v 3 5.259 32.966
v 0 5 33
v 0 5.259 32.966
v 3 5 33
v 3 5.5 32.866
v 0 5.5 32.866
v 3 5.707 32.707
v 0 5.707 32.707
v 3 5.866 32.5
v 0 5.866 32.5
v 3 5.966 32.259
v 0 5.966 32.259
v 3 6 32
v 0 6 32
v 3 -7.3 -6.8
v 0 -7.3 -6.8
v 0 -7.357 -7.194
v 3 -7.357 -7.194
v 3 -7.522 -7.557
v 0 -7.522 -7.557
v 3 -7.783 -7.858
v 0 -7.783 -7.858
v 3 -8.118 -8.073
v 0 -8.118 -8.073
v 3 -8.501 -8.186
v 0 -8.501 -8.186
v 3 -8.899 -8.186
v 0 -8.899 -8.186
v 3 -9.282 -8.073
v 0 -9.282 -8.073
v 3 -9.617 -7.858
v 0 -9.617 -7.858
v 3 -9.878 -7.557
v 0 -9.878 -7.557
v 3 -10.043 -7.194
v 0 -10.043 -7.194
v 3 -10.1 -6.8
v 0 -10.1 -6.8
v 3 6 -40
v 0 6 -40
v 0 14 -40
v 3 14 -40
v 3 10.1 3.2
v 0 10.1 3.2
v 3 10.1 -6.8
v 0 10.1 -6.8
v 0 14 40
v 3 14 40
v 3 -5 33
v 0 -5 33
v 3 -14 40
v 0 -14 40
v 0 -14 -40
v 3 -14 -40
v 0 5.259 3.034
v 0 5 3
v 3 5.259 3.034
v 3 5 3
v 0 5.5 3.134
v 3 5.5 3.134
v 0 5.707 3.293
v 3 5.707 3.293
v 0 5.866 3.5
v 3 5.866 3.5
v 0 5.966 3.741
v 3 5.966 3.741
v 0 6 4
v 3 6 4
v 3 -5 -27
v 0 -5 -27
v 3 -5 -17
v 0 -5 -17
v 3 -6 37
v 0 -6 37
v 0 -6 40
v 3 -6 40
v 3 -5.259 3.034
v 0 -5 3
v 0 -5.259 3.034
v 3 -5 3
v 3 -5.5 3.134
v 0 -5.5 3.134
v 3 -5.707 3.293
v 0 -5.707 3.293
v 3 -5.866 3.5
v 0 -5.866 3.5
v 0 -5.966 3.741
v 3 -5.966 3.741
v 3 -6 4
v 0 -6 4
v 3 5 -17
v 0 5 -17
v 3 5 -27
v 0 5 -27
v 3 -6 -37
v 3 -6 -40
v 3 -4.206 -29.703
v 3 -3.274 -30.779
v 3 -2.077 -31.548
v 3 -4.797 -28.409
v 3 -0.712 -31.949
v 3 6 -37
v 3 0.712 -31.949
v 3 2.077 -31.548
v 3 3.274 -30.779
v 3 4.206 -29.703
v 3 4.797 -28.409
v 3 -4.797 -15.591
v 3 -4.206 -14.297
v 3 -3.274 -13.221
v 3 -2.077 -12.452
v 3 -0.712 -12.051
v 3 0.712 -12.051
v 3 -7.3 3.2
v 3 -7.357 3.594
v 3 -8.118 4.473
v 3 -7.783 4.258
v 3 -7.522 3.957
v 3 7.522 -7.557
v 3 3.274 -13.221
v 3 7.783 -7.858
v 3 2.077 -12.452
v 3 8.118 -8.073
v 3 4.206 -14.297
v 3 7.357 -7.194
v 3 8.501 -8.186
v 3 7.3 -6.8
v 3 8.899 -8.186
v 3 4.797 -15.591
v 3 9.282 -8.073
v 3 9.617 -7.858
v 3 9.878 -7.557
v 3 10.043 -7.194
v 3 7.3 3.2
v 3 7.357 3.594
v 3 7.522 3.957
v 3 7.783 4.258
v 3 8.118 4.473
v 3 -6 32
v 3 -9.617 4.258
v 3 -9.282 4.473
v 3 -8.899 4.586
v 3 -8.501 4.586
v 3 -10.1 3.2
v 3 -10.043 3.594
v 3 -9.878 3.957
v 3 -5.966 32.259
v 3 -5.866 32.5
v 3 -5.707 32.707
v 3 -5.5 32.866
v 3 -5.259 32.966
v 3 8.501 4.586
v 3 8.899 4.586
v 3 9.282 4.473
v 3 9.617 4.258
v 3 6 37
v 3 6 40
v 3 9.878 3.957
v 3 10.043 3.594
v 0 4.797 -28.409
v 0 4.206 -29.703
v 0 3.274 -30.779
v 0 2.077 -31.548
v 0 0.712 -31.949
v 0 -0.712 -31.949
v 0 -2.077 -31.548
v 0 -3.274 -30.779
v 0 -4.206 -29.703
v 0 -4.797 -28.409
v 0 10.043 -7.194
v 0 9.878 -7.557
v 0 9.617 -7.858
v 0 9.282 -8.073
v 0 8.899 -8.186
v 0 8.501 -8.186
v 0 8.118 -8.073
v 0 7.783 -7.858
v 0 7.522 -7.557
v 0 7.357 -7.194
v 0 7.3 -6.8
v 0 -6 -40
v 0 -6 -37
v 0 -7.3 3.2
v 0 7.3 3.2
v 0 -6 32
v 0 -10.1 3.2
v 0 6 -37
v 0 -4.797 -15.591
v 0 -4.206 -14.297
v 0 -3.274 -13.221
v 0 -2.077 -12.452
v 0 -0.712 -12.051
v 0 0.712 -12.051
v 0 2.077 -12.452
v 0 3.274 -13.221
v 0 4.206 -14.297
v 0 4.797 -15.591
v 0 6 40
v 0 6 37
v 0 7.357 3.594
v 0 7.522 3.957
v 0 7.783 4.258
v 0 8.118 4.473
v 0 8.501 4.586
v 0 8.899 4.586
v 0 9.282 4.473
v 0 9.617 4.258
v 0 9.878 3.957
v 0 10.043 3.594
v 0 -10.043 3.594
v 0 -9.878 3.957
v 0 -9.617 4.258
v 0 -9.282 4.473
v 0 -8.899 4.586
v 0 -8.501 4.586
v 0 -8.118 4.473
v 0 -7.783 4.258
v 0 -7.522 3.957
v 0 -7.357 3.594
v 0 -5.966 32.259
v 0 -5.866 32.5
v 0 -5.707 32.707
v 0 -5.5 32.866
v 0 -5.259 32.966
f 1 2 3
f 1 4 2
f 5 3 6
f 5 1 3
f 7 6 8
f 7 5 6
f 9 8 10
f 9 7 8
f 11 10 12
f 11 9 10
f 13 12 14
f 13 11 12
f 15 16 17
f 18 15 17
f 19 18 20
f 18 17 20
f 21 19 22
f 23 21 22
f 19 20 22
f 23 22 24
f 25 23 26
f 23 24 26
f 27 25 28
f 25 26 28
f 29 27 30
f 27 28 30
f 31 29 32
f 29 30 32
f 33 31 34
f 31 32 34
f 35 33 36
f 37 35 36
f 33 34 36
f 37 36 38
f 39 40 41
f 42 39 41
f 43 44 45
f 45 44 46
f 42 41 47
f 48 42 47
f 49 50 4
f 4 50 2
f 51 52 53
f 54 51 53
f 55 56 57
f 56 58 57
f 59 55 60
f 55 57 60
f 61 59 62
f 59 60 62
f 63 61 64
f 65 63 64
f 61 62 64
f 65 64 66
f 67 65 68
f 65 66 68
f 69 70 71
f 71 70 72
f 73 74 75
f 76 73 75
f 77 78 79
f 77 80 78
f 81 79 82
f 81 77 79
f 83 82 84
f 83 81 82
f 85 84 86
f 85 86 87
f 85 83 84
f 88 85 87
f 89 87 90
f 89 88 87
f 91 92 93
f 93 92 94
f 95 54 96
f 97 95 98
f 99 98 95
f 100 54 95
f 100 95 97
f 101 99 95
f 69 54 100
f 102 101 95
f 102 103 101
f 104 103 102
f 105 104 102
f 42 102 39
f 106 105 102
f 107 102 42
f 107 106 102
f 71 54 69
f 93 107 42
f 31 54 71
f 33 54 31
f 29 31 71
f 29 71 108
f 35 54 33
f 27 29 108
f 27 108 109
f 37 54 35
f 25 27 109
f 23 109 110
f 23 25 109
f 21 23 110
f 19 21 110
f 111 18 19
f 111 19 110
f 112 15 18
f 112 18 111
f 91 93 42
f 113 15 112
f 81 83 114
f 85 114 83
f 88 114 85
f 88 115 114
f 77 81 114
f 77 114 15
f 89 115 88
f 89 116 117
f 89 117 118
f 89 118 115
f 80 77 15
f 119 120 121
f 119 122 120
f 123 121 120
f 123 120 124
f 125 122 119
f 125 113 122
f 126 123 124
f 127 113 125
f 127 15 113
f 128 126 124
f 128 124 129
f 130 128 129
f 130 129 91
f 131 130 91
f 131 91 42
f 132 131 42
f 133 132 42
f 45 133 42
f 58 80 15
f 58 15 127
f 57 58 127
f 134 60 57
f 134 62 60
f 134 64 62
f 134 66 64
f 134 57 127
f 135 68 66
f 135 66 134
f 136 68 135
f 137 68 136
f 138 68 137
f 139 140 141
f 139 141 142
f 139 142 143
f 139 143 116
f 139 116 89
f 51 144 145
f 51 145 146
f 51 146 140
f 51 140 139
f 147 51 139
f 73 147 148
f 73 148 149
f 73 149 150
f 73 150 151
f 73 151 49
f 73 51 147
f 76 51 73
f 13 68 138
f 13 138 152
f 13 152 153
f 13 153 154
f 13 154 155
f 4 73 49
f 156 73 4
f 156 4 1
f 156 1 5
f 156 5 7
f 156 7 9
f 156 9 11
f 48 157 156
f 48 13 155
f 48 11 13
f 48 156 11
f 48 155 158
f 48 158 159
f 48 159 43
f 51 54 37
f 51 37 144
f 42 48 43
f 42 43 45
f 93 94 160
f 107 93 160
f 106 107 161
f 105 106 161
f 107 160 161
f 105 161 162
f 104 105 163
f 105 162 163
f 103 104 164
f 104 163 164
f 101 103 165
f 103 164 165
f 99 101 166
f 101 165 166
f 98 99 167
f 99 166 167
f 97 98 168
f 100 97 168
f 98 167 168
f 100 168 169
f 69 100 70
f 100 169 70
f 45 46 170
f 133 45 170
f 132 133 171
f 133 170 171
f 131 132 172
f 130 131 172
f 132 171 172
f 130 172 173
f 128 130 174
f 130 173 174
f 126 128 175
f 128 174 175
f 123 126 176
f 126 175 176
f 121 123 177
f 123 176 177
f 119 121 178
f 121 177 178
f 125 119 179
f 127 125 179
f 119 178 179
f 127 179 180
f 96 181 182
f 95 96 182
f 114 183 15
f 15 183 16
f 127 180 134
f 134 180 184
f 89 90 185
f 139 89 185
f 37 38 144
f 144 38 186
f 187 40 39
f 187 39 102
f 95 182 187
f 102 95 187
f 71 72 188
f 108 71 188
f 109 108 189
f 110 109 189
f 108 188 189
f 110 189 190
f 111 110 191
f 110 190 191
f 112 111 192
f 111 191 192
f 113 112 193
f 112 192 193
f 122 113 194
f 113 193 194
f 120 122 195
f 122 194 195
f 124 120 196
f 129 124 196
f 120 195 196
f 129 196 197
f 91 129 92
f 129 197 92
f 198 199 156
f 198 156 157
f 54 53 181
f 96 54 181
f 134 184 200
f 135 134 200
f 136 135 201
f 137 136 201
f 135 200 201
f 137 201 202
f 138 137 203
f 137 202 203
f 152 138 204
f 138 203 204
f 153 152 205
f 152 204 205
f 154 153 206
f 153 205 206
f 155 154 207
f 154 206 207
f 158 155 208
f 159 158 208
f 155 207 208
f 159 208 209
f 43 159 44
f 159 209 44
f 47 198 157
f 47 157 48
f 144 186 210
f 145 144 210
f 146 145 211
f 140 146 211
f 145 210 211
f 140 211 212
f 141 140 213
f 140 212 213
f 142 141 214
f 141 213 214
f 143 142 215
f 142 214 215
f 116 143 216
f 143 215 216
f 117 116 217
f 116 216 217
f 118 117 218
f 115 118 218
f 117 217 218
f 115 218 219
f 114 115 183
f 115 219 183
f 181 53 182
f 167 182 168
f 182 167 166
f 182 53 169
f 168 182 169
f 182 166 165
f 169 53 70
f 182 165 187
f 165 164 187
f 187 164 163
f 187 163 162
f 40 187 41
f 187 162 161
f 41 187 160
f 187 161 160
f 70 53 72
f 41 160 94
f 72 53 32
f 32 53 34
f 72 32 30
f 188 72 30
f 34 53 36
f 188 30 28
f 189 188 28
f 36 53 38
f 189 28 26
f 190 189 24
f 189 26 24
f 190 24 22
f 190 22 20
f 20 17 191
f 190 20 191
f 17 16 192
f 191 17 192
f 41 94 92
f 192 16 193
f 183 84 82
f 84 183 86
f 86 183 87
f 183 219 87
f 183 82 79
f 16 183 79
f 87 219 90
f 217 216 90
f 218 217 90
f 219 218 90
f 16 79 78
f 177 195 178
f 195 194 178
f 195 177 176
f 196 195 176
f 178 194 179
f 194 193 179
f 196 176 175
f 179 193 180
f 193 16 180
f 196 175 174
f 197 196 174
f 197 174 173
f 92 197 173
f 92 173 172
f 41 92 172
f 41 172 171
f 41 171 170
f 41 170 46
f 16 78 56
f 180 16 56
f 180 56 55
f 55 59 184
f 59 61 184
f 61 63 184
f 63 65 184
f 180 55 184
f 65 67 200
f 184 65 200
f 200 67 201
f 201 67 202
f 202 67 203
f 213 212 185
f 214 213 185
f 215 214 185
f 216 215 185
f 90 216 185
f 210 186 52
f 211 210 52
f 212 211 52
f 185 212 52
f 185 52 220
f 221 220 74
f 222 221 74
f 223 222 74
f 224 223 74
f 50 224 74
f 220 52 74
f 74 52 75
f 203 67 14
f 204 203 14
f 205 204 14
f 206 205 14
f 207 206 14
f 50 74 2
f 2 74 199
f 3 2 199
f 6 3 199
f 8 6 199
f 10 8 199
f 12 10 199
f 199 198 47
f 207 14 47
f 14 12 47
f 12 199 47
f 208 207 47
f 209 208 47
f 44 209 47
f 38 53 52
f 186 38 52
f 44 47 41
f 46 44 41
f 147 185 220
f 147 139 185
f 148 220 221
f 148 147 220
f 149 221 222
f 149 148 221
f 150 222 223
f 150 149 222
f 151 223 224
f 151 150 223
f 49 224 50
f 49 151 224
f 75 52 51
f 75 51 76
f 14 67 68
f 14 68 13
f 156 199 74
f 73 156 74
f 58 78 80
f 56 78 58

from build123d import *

# Parameters (mm, degrees)
F0_W     = 12
F0_H     = 30
F0_W_2   = 8
F0_H_2   = 3
F1_DEPTH = 3
F2_R     = 1


with BuildPart() as f1:
    # F0 (on Right) → F1 (new body)
    with BuildSketch(Plane.YZ):
        Polygon((14, -37), (14, 37), (6, 37), (-6, 37), (-14, 37), (-14, -37), (-6, -37), (6, -37), align=None)
        with BuildLine():
            Line((-10.1, -6.8), (-10.1, 3.2))
            ThreePointArc((-10.1, 3.2), (-8.7, 4.6), (-7.3, 3.2))
            Line((-7.3, 3.2), (-7.3, -6.8))
            ThreePointArc((-7.3, -6.8), (-8.7, -8.2), (-10.1, -6.8))
        make_face(mode=Mode.SUBTRACT)
        with BuildLine():
            ThreePointArc((-5, -17), (0, -12), (5, -17))
            Line((5, -17), (5, -27))
            ThreePointArc((5, -27), (0, -32), (-5, -27))
            Line((-5, -27), (-5, -17))
        make_face(mode=Mode.SUBTRACT)
        with BuildLine():
            ThreePointArc((7.3, 3.2), (8.7, 4.6), (10.1, 3.2))
            Line((10.1, 3.2), (10.1, -6.8))
            ThreePointArc((10.1, -6.8), (8.7, -8.2), (7.3, -6.8))
            Line((7.3, -6.8), (7.3, 3.2))
        make_face(mode=Mode.SUBTRACT)
        with Locations((0, 18)):
            Rectangle(F0_W, F0_H, mode=Mode.SUBTRACT)
        with Locations((10, 38.5)):
            Rectangle(F0_W_2, F0_H_2)
        with Locations((10, -38.5)):
            Rectangle(F0_W_2, F0_H_2)
        with Locations((-10, 38.5)):
            Rectangle(F0_W_2, F0_H_2)
        with Locations((-10, -38.5)):
            Rectangle(F0_W_2, F0_H_2)
    extrude(amount=F1_DEPTH)

    # F2
    f2_edges = [f1.edges().sort_by_distance(p)[0] for p in [
        (1.5, 6, 33),
        (1.5, -6, 33),
        (1.5, -6, 3),
        (1.5, 6, 3),
    ]]
    fillet(f2_edges, radius=F2_R)


solid = f1.part
